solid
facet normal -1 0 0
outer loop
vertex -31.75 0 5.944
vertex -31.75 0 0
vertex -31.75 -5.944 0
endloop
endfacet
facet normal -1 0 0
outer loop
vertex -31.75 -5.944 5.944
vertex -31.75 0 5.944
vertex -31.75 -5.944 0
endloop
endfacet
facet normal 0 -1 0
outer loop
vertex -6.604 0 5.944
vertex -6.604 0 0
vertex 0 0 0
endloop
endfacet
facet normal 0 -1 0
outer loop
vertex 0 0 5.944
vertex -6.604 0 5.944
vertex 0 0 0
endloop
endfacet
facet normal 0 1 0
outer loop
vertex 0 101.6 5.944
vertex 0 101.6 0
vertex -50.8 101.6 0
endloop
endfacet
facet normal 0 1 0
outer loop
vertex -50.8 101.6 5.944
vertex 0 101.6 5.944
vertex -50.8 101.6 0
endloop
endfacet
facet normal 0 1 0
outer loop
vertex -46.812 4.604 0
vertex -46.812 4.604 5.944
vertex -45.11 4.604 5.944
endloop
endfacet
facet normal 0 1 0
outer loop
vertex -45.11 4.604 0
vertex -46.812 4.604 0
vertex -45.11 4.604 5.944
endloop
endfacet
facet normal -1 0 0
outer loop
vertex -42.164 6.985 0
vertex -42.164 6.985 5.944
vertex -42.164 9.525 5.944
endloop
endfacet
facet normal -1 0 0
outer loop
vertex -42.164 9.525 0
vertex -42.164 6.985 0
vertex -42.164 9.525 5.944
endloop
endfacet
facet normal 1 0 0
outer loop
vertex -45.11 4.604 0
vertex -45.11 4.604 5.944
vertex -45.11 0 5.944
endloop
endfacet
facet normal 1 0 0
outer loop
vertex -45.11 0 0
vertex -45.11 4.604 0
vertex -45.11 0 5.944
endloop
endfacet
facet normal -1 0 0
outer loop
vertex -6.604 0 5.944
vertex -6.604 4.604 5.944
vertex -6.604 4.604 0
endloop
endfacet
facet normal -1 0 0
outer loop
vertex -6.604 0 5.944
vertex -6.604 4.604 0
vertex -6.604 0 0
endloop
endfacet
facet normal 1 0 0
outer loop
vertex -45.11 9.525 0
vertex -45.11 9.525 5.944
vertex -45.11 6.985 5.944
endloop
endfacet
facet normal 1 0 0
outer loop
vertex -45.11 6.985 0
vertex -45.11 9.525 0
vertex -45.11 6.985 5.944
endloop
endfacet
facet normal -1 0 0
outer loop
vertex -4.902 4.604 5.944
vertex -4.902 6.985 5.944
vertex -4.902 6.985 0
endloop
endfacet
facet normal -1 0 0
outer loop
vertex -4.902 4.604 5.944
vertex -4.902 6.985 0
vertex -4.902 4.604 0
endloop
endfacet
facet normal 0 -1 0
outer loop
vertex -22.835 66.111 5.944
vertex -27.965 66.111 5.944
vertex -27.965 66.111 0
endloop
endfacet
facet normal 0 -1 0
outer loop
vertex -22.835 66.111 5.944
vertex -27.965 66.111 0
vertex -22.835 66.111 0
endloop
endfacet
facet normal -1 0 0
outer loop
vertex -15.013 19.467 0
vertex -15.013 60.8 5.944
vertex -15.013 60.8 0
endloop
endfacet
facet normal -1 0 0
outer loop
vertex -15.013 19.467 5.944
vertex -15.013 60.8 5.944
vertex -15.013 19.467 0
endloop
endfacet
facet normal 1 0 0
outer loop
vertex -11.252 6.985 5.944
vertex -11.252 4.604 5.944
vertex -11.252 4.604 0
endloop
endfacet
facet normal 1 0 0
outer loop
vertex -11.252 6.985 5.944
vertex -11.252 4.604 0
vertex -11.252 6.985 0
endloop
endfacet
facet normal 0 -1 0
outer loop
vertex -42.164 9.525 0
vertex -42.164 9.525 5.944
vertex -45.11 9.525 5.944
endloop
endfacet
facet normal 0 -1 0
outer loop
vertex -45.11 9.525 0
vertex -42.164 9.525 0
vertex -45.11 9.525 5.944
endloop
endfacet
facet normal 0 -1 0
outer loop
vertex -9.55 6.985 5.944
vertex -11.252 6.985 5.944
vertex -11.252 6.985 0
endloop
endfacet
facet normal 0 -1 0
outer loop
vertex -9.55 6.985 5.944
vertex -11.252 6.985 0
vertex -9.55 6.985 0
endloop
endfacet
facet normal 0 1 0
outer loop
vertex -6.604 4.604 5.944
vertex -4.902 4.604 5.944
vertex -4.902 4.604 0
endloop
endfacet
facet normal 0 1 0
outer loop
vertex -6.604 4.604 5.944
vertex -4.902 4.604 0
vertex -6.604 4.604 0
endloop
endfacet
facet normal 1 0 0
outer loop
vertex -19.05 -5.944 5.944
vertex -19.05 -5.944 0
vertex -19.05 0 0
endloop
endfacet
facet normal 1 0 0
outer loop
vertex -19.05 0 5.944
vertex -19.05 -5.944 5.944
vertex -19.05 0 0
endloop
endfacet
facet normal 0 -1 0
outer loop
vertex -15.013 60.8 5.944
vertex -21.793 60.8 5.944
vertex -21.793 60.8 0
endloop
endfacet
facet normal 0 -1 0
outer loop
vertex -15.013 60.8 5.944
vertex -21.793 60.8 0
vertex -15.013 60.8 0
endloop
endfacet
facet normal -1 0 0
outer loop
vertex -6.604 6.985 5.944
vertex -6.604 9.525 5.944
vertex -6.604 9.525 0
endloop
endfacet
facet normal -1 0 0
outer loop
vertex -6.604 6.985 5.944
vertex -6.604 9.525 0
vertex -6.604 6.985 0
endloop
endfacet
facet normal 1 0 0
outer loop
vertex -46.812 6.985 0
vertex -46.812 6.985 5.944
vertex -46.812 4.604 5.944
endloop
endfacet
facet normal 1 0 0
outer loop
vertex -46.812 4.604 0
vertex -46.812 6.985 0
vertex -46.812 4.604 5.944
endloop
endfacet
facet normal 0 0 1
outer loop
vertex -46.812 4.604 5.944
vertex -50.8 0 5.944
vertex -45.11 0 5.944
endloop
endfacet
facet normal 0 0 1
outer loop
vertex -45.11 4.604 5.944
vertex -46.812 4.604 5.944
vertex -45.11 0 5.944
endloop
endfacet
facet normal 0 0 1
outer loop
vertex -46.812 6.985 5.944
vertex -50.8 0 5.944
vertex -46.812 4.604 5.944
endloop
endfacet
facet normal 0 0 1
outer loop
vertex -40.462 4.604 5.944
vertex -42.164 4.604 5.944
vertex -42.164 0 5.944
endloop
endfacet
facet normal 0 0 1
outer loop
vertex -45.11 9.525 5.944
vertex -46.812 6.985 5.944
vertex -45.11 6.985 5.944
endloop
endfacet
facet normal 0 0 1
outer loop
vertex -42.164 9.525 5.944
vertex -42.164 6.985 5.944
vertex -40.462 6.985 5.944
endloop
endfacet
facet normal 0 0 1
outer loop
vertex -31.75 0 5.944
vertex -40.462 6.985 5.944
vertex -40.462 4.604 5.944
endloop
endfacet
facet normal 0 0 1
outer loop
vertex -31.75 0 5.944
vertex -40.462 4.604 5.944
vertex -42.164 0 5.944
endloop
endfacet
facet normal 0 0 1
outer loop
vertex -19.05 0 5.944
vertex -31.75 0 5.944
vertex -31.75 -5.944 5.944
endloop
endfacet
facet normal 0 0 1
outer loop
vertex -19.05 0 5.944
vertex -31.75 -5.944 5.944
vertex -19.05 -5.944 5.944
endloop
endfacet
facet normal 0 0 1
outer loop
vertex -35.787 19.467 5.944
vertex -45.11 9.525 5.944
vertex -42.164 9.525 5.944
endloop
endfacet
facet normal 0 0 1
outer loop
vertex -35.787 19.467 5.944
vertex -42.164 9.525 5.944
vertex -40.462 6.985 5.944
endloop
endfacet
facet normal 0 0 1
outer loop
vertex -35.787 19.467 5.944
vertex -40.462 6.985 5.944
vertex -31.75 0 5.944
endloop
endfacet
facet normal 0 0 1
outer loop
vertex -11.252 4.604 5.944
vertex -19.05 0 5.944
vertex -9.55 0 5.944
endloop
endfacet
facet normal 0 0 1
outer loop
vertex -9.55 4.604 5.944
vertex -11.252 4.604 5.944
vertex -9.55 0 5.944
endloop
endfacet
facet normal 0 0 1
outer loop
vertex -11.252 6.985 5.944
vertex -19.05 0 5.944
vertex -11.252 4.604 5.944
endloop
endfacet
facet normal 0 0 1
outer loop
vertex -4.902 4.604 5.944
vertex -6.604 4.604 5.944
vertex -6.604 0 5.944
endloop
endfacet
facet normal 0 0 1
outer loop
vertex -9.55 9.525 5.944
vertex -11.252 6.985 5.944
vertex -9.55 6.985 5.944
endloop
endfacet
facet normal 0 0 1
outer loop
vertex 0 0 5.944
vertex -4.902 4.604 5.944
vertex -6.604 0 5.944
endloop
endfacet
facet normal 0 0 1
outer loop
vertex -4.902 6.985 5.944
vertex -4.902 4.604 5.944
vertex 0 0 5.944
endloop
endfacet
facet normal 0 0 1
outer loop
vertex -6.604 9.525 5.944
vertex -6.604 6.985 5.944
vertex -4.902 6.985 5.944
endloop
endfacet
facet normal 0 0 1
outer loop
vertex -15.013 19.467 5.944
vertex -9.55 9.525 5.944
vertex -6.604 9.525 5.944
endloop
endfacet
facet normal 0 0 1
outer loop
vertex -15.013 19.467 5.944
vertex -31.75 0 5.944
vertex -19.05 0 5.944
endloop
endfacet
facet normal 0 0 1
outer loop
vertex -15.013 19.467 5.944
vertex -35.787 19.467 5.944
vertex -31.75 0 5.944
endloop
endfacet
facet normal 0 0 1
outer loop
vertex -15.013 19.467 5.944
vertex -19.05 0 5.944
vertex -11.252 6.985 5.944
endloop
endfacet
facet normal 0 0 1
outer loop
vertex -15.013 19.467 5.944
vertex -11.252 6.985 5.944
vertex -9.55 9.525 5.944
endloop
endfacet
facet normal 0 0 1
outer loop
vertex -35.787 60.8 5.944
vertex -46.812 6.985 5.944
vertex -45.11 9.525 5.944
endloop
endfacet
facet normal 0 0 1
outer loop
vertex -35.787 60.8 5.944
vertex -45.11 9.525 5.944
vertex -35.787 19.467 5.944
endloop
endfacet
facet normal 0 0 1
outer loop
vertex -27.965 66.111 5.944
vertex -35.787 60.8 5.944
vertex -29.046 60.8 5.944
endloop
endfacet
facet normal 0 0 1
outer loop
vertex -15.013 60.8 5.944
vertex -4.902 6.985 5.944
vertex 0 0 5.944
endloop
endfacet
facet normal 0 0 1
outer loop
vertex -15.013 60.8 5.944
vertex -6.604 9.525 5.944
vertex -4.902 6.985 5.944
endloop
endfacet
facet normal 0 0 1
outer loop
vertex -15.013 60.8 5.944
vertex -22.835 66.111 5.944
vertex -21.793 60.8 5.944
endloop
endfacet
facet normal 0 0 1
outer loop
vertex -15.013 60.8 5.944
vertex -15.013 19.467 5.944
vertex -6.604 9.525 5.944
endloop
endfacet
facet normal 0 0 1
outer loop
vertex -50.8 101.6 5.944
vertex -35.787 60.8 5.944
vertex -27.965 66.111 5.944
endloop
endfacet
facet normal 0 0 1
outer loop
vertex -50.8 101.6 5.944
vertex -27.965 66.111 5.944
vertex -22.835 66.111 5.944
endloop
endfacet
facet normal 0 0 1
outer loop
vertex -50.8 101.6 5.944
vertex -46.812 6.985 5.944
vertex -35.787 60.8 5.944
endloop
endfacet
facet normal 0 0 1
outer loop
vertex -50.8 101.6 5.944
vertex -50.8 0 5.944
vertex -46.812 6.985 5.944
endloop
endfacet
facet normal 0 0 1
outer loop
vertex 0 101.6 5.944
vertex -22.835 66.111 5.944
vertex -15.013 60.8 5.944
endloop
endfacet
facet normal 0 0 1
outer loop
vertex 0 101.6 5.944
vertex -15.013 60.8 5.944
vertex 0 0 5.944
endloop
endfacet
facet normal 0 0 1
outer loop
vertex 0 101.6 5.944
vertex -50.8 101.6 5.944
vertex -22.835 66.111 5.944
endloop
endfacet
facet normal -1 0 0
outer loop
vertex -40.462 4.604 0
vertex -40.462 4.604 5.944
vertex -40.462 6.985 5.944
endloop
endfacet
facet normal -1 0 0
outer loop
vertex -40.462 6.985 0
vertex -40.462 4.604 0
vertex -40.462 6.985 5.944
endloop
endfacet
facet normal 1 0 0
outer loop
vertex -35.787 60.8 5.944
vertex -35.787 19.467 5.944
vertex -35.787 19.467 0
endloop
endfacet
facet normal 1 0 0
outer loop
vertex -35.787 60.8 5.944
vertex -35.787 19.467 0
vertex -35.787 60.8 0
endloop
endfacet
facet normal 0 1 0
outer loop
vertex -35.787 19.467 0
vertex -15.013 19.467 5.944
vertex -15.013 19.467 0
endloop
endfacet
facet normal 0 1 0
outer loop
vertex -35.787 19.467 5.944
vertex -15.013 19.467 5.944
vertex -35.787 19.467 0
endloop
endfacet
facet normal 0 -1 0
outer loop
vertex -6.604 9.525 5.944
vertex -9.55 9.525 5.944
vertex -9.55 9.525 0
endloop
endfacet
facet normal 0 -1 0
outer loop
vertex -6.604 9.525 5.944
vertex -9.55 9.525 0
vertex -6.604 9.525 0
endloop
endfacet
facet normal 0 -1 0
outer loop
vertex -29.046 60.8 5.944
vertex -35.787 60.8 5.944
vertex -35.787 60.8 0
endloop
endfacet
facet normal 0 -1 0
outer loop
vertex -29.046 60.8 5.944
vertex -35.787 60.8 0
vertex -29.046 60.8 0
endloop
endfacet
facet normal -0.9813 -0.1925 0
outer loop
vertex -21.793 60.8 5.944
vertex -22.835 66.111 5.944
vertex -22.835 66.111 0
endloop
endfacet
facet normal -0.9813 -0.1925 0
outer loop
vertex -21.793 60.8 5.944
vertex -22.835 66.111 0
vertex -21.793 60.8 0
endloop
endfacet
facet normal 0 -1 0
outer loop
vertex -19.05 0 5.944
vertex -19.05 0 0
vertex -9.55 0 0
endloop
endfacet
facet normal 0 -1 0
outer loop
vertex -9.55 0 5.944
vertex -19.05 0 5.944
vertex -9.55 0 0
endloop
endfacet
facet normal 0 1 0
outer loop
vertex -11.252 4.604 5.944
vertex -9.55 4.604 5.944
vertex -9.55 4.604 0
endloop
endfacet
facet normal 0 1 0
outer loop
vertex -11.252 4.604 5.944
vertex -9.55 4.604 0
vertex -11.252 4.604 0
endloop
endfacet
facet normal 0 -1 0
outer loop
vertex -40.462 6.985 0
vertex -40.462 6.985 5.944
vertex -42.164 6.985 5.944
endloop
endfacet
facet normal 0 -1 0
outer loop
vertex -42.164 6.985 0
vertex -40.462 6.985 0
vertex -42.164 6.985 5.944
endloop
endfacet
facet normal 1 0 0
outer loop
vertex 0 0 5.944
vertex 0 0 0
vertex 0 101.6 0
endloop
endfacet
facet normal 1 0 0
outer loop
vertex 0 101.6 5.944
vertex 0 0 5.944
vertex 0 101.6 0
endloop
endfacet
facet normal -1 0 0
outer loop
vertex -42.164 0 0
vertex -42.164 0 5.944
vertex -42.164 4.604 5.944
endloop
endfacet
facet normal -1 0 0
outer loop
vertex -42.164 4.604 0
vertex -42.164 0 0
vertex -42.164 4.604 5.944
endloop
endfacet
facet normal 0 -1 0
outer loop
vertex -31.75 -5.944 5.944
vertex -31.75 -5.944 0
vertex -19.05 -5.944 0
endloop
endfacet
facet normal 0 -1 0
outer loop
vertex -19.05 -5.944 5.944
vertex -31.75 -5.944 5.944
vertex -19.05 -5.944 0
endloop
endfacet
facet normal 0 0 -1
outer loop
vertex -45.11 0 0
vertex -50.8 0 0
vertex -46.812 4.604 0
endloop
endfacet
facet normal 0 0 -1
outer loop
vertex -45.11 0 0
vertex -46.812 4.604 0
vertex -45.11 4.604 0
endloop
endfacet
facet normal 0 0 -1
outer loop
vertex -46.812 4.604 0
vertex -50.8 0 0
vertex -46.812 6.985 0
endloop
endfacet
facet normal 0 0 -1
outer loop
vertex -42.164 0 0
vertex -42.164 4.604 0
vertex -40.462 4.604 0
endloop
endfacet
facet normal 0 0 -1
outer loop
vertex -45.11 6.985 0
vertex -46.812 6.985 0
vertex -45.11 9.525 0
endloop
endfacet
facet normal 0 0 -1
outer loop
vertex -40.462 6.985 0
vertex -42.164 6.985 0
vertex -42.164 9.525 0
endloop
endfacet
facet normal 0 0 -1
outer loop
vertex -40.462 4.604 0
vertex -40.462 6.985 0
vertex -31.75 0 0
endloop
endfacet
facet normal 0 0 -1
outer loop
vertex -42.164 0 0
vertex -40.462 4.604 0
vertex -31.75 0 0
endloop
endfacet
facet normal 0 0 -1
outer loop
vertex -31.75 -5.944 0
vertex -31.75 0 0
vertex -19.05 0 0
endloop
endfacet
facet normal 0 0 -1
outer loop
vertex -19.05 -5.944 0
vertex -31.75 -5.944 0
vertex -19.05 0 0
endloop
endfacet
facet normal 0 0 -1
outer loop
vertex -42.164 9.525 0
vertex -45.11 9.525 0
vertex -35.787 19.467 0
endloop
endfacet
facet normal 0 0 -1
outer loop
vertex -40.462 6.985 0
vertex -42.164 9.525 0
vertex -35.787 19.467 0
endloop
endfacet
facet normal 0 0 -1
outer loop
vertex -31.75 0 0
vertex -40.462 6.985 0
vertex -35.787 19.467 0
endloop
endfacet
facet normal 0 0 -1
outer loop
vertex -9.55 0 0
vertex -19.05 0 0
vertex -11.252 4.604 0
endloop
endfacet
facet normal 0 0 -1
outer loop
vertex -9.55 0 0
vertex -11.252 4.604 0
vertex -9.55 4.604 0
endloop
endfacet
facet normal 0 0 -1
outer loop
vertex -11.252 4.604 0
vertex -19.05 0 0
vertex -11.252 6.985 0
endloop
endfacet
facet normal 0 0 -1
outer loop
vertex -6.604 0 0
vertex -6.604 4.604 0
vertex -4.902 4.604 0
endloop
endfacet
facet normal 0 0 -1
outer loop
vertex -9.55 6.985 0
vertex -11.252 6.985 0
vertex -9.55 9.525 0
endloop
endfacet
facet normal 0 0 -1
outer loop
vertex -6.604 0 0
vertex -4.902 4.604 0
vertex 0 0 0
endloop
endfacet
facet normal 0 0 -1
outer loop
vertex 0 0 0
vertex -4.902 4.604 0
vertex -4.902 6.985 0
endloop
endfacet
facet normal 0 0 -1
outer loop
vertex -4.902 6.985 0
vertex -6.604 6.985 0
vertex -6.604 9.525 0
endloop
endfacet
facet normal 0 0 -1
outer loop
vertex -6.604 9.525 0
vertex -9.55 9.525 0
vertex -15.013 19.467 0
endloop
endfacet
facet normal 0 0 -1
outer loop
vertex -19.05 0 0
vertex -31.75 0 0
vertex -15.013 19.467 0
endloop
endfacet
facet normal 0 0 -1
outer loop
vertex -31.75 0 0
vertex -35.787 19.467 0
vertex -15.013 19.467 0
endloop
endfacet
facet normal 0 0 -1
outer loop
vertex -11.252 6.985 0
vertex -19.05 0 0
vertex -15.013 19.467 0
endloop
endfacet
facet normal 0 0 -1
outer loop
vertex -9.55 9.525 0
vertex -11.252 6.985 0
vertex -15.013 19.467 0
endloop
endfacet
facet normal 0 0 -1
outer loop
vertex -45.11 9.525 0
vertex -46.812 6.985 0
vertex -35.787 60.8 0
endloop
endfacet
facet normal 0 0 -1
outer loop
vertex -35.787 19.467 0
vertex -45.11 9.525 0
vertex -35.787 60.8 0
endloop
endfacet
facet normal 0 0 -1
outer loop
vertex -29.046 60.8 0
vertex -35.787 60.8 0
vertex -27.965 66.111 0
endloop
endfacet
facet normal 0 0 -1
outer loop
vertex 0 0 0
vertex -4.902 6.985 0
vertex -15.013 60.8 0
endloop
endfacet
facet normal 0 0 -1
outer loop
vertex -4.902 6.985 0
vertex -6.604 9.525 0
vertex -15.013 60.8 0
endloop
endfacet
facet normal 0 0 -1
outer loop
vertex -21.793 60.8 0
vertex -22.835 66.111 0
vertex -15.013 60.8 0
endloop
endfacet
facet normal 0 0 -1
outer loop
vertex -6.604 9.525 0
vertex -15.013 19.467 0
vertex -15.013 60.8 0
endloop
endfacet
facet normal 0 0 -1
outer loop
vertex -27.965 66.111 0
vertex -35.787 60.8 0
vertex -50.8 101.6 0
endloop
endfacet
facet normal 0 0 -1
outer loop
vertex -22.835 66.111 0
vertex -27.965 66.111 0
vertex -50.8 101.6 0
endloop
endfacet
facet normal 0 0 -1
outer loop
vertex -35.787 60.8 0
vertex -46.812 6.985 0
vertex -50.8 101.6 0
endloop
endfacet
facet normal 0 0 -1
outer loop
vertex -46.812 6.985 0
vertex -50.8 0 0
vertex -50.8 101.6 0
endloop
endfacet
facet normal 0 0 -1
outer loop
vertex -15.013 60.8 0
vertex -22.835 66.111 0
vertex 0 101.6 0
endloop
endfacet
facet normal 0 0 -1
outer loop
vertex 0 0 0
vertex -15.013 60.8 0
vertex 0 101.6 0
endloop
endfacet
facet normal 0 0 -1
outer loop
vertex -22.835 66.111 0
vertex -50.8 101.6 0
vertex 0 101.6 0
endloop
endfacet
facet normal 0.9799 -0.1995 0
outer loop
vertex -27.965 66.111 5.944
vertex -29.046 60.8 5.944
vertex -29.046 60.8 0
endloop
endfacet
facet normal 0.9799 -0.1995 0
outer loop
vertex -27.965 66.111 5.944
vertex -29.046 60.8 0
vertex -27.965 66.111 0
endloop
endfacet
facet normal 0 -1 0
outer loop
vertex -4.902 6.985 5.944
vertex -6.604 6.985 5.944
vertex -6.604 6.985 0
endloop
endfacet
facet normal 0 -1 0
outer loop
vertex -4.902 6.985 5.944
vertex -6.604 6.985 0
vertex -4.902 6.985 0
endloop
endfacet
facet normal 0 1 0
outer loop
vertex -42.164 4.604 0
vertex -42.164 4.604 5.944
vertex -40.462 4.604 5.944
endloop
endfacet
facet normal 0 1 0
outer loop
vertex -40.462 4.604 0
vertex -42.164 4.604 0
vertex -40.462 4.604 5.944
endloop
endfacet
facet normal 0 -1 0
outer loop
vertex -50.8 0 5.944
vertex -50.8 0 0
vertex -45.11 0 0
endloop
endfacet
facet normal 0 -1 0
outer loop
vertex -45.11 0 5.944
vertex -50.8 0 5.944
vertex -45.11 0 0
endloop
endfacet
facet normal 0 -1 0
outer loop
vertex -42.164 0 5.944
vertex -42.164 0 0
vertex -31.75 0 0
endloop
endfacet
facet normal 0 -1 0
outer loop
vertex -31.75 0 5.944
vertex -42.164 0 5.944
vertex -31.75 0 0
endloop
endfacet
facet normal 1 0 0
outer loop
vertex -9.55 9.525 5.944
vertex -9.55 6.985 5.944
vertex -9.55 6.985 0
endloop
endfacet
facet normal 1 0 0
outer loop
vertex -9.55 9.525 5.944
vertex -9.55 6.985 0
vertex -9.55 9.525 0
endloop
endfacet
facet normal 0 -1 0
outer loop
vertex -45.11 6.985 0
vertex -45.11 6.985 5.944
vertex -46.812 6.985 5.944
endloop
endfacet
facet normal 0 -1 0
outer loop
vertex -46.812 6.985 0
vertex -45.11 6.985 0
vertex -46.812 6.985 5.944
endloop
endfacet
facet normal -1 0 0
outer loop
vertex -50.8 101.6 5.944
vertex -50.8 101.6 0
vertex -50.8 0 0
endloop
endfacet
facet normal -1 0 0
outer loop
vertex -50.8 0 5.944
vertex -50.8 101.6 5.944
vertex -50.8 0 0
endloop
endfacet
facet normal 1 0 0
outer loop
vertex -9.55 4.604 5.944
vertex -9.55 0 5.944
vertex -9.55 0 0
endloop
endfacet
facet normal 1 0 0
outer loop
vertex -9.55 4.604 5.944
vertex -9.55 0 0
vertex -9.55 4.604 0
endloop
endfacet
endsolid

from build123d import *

# Parameters (mm, degrees)
BOSS_EXTRUDE1_DEPTH = 5.9436
CUT_EXTRUDE1_DEPTH  = 6.9436
CUT_EXTRUDE2_DEPTH  = 6.9436


with BuildPart() as part:
    # Sketch2 → Boss-Extrude1 (new body)
    with BuildSketch(Plane.XY):
        Polygon((0, 0), (0, 101.6), (-50.8, 101.6), (-50.8, 0), (-31.75, 0), (-31.75, -5.9436), (-19.05, -5.9436), (-19.05, 0), align=None)
    extrude(amount=BOSS_EXTRUDE1_DEPTH)

    # Sketch3 → Cut-Extrude1 (cut, through all)
    with BuildSketch(Plane.XY.offset(5.9436)):
        Polygon((-27.965479444, 66.110608141), (-22.834520556, 66.110608141), (-21.792739864, 60.799784967), (-15.013102806, 60.799784967), (-15.013102806, 19.467361344), (-35.786897194, 19.467361344), (-35.786897194, 60.799784967), (-29.045829513, 60.8), align=None)
    extrude(amount=-CUT_EXTRUDE1_DEPTH, mode=Mode.SUBTRACT)

    # Sketch4 → Cut-Extrude2 (cut, through all)
    with BuildSketch(Plane.XY.offset(5.9436)):
        Polygon((-9.550241905, -0.00026), (-9.550241905, 4.60375), (-11.252041905, 4.60375), (-11.252041905, 6.985), (-9.550241905, 6.985), (-9.550241905, 9.525), (-6.603841905, 9.525), (-6.603841905, 6.985), (-4.902041905, 6.985), (-4.902041905, 4.60375), (-6.603841905, 4.60375), (-6.603841905, -0.00026), align=None)
        Polygon((-46.812041905, 4.60375), (-45.110241905, 4.60375), (-45.110241905, -0.00026), (-42.163841905, -0.00026), (-42.163841905, 4.60375), (-40.462041905, 4.60375), (-40.462041905, 6.985), (-42.163841905, 6.985), (-42.163841905, 9.525), (-45.110241905, 9.525), (-45.110241905, 6.985), (-46.812041905, 6.985), align=None)
    extrude(amount=-CUT_EXTRUDE2_DEPTH, mode=Mode.SUBTRACT)


solid = part.part
